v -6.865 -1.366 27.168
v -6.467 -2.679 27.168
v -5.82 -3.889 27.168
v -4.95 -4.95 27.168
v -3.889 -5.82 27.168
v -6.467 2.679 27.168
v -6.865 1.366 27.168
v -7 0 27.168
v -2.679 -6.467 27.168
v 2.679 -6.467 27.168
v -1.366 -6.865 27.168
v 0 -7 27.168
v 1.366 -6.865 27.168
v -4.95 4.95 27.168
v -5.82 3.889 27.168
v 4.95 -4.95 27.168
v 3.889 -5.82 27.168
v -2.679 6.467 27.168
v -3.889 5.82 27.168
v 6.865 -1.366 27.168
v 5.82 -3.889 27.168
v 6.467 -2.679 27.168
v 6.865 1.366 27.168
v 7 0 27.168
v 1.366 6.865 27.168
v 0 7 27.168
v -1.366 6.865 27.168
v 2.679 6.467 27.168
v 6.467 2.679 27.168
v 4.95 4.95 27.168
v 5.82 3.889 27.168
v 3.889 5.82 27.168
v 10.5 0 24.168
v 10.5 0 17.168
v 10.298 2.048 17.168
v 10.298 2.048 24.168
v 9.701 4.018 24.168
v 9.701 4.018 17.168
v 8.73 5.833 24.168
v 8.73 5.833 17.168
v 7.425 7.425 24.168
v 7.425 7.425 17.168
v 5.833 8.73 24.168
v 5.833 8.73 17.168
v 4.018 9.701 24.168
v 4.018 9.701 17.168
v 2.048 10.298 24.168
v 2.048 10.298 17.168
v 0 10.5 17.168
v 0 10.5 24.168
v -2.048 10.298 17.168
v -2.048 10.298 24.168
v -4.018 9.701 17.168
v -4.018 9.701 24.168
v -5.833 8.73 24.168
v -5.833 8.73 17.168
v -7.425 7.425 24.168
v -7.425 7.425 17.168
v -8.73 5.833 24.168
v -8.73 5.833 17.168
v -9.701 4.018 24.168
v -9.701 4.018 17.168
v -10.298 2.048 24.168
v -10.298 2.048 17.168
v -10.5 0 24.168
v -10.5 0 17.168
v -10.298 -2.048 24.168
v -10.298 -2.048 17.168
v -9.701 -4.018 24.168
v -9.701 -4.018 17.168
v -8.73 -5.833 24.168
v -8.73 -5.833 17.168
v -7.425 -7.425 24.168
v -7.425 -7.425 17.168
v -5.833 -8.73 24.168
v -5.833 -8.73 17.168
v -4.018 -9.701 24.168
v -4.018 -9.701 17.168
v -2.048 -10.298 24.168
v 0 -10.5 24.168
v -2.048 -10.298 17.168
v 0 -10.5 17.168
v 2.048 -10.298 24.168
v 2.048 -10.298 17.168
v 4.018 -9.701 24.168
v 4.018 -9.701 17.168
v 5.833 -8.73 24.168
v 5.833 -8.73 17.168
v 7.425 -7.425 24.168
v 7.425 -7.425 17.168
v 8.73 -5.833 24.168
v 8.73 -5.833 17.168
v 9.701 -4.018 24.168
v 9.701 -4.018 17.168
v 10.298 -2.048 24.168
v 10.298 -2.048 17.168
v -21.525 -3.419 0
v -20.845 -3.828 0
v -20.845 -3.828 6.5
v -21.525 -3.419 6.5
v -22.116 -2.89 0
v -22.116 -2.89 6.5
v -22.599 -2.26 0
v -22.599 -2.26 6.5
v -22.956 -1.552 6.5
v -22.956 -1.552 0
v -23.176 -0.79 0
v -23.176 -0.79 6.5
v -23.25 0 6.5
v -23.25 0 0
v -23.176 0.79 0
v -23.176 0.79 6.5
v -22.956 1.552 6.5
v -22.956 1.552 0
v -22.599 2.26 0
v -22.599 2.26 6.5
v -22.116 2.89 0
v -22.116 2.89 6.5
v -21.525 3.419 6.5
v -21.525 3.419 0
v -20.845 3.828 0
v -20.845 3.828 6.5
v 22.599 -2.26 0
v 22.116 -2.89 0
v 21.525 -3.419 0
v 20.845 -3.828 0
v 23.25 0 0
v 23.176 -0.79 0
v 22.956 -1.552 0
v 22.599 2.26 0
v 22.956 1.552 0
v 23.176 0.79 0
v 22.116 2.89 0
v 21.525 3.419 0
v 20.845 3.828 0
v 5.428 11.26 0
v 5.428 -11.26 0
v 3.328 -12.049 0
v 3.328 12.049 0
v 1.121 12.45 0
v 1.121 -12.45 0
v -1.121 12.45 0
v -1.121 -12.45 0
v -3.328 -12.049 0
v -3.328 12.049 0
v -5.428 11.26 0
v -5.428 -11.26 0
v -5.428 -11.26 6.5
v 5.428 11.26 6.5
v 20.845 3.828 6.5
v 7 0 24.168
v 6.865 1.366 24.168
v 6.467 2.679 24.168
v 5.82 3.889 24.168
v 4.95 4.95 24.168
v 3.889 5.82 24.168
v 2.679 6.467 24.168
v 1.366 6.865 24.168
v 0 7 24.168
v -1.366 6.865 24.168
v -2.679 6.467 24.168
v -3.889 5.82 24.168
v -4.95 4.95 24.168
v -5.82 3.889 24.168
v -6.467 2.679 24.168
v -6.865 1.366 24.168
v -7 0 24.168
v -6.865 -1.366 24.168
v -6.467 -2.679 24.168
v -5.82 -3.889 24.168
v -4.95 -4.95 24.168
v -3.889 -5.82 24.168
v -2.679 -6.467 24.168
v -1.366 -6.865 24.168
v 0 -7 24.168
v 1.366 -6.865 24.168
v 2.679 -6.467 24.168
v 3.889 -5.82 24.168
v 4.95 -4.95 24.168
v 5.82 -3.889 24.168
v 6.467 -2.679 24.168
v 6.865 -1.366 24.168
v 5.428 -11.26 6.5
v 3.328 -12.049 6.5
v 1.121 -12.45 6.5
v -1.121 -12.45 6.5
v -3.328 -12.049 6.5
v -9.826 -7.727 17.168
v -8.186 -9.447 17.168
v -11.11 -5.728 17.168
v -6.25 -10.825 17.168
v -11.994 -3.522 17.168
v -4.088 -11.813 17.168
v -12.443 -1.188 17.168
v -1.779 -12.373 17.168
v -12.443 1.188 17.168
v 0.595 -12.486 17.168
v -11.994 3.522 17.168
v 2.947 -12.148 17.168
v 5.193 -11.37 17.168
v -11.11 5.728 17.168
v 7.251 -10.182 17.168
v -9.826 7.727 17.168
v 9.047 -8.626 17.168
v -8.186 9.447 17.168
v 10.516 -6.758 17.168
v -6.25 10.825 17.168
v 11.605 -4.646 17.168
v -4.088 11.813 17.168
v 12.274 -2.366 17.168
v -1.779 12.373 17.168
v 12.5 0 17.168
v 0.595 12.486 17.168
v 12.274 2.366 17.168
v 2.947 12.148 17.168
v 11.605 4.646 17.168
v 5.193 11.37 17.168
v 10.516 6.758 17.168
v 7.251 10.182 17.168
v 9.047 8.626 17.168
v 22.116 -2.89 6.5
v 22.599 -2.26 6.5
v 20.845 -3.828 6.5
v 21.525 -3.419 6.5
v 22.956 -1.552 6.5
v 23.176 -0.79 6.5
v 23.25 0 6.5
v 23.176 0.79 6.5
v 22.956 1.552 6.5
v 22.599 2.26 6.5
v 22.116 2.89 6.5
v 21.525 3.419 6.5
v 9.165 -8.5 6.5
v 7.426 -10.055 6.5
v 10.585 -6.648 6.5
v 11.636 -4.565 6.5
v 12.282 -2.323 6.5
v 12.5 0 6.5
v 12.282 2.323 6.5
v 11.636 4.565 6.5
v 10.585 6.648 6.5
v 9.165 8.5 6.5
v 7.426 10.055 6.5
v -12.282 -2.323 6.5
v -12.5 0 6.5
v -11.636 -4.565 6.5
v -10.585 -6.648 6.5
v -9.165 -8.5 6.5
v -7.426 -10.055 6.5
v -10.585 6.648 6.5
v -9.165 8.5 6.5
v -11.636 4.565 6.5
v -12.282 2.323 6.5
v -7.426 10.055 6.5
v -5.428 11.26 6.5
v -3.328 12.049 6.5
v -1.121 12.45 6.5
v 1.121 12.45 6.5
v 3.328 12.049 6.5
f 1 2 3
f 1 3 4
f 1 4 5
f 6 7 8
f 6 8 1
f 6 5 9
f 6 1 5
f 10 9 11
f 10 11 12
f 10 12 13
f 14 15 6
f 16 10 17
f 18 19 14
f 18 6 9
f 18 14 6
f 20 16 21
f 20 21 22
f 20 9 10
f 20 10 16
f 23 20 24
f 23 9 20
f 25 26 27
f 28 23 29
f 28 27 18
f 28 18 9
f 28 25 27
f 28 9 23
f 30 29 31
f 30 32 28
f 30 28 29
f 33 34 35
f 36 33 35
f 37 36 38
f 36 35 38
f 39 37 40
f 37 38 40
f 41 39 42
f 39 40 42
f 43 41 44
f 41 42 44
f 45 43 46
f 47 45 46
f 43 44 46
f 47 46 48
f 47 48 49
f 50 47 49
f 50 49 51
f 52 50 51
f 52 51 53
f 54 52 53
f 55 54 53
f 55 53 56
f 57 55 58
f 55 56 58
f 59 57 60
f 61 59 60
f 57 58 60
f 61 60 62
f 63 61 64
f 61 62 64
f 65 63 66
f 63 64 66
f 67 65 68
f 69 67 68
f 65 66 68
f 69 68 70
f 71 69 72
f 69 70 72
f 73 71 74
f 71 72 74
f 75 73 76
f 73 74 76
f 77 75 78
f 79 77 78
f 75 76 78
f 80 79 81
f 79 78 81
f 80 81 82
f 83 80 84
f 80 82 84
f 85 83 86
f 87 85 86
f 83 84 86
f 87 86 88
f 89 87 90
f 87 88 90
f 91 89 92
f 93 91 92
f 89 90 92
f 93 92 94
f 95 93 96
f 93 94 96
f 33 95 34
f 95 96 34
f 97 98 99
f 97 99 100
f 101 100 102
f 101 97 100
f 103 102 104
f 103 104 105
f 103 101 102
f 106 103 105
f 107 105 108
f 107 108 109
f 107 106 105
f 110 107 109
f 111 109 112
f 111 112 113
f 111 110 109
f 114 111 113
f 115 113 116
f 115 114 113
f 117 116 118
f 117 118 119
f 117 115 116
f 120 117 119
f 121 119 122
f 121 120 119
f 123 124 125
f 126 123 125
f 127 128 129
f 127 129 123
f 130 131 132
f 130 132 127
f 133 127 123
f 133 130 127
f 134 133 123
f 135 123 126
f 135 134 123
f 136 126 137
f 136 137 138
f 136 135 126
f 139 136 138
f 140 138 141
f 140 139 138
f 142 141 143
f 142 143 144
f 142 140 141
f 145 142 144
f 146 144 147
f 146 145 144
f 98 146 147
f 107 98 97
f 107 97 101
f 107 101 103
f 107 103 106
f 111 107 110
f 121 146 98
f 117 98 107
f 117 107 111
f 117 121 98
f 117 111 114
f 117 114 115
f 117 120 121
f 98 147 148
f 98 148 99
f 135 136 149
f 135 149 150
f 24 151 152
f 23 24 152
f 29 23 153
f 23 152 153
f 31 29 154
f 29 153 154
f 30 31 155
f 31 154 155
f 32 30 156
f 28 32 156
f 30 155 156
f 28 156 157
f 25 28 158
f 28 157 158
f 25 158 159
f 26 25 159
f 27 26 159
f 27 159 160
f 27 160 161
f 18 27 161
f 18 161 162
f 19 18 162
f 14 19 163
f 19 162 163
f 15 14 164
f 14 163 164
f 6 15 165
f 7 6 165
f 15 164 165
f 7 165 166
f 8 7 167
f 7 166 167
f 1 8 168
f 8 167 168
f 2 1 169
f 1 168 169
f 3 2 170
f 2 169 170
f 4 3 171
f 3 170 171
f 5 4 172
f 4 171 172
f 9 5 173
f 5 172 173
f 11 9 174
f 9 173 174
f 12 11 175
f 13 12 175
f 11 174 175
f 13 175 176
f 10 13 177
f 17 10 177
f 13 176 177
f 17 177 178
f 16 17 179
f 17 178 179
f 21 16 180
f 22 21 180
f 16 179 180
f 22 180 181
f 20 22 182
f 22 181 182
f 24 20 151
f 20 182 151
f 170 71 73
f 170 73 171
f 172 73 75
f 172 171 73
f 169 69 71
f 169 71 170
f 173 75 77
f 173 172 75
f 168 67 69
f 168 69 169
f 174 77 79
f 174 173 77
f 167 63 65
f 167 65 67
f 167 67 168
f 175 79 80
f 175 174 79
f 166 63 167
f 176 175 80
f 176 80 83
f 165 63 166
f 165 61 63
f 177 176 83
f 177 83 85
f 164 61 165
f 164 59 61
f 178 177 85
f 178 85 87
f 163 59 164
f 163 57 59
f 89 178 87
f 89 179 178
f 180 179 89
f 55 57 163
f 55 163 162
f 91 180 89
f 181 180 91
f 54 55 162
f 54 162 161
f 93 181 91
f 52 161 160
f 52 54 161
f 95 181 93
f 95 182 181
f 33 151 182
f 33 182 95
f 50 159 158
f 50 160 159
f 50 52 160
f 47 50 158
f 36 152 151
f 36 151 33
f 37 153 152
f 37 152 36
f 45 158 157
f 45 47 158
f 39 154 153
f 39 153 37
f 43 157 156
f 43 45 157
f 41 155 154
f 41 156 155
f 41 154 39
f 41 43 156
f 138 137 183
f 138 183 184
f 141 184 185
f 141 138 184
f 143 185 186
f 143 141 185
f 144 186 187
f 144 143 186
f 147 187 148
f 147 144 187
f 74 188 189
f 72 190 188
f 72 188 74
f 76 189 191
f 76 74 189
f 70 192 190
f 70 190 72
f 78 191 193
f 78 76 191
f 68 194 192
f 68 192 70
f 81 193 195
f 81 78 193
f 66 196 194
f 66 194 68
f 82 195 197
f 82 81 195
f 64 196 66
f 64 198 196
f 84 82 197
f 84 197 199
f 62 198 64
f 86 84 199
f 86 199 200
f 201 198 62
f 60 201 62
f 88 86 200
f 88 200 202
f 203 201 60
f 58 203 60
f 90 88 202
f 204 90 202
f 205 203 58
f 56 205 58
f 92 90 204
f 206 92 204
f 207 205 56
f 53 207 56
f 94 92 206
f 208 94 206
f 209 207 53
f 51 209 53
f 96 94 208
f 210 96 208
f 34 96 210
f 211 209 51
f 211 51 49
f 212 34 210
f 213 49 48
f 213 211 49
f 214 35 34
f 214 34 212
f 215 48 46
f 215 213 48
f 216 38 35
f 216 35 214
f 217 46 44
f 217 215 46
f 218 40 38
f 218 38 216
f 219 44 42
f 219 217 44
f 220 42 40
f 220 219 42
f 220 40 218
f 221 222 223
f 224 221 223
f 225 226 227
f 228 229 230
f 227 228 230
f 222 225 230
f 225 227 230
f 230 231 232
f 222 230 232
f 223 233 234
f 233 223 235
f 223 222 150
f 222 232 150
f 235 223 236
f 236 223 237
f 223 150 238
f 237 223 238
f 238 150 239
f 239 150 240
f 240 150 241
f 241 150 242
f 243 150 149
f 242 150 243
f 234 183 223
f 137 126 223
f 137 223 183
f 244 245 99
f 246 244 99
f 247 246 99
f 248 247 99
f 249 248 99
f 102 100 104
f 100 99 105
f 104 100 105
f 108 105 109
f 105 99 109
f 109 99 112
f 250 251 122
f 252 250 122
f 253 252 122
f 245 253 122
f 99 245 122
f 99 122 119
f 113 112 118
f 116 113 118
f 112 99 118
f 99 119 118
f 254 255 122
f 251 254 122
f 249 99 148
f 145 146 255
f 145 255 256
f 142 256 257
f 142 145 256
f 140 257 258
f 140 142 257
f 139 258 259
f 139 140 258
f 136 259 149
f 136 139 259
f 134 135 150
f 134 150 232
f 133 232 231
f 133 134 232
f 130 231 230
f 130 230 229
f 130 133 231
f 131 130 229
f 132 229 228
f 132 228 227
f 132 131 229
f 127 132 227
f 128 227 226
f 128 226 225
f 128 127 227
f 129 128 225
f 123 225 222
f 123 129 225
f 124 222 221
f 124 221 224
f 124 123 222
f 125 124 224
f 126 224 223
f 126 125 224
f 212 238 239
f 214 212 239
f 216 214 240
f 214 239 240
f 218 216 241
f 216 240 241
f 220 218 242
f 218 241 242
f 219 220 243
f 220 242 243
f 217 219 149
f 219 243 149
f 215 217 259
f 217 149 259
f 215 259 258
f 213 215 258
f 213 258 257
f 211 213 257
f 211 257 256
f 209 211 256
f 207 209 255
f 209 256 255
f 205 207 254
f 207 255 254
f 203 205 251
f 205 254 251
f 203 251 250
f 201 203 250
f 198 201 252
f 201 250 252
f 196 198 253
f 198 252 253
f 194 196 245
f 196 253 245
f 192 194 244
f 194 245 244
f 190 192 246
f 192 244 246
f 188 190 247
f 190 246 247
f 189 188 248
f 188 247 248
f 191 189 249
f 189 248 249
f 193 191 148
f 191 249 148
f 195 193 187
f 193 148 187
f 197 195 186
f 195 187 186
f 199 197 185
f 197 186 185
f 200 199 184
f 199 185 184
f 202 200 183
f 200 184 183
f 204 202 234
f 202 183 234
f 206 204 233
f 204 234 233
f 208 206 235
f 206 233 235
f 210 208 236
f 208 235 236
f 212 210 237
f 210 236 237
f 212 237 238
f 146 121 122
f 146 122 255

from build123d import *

# Parameters (mm, degrees)
BOSS_EXTRUDE1_DEPTH = 6.5
SKETCH2_R           = 12.5
BOSS_EXTRUDE2_DEPTH = 10.668
SKETCH3_R           = 10.5
BOSS_EXTRUDE3_DEPTH = 7
SKETCH4_R           = 7
BOSS_EXTRUDE4_DEPTH = 3


with BuildPart() as part:
    # Sketch1 → Boss-Extrude1 (new body)
    with BuildSketch(Plane.XY):
        with BuildLine():
            Line((-20.845394737, 3.828448545), (-5.427631579, 11.260142781))
            ThreePointArc((-5.427631579, 11.260142781), (0, 12.5), (5.427631579, 11.260142781))
            Line((5.427631579, 11.260142781), (20.845394737, 3.828448545))
            ThreePointArc((20.845394737, 3.828448545), (23.25, 0), (20.845394737, -3.828448545))
            Line((20.845394737, -3.828448545), (5.427631579, -11.260142781))
            ThreePointArc((5.427631579, -11.260142781), (0, -12.5), (-5.427631579, -11.260142781))
            Line((-5.427631579, -11.260142781), (-20.845394737, -3.828448545))
            ThreePointArc((-20.845394737, -3.828448545), (-23.25, 0), (-20.845394737, 3.828448545))
        make_face()
    extrude(amount=BOSS_EXTRUDE1_DEPTH)

    # Sketch2 → Boss-Extrude2 (add)
    with BuildSketch(Plane.XY.offset(6.5)):
        Circle(SKETCH2_R)
    extrude(amount=BOSS_EXTRUDE2_DEPTH)

    # Sketch3 → Boss-Extrude3 (add)
    with BuildSketch(Plane.XY.offset(17.168)):
        Circle(SKETCH3_R)
    extrude(amount=BOSS_EXTRUDE3_DEPTH)

    # Sketch4 → Boss-Extrude4 (add)
    with BuildSketch(Plane.XY.offset(24.168)):
        Circle(SKETCH4_R)
    extrude(amount=BOSS_EXTRUDE4_DEPTH)


solid = part.part
